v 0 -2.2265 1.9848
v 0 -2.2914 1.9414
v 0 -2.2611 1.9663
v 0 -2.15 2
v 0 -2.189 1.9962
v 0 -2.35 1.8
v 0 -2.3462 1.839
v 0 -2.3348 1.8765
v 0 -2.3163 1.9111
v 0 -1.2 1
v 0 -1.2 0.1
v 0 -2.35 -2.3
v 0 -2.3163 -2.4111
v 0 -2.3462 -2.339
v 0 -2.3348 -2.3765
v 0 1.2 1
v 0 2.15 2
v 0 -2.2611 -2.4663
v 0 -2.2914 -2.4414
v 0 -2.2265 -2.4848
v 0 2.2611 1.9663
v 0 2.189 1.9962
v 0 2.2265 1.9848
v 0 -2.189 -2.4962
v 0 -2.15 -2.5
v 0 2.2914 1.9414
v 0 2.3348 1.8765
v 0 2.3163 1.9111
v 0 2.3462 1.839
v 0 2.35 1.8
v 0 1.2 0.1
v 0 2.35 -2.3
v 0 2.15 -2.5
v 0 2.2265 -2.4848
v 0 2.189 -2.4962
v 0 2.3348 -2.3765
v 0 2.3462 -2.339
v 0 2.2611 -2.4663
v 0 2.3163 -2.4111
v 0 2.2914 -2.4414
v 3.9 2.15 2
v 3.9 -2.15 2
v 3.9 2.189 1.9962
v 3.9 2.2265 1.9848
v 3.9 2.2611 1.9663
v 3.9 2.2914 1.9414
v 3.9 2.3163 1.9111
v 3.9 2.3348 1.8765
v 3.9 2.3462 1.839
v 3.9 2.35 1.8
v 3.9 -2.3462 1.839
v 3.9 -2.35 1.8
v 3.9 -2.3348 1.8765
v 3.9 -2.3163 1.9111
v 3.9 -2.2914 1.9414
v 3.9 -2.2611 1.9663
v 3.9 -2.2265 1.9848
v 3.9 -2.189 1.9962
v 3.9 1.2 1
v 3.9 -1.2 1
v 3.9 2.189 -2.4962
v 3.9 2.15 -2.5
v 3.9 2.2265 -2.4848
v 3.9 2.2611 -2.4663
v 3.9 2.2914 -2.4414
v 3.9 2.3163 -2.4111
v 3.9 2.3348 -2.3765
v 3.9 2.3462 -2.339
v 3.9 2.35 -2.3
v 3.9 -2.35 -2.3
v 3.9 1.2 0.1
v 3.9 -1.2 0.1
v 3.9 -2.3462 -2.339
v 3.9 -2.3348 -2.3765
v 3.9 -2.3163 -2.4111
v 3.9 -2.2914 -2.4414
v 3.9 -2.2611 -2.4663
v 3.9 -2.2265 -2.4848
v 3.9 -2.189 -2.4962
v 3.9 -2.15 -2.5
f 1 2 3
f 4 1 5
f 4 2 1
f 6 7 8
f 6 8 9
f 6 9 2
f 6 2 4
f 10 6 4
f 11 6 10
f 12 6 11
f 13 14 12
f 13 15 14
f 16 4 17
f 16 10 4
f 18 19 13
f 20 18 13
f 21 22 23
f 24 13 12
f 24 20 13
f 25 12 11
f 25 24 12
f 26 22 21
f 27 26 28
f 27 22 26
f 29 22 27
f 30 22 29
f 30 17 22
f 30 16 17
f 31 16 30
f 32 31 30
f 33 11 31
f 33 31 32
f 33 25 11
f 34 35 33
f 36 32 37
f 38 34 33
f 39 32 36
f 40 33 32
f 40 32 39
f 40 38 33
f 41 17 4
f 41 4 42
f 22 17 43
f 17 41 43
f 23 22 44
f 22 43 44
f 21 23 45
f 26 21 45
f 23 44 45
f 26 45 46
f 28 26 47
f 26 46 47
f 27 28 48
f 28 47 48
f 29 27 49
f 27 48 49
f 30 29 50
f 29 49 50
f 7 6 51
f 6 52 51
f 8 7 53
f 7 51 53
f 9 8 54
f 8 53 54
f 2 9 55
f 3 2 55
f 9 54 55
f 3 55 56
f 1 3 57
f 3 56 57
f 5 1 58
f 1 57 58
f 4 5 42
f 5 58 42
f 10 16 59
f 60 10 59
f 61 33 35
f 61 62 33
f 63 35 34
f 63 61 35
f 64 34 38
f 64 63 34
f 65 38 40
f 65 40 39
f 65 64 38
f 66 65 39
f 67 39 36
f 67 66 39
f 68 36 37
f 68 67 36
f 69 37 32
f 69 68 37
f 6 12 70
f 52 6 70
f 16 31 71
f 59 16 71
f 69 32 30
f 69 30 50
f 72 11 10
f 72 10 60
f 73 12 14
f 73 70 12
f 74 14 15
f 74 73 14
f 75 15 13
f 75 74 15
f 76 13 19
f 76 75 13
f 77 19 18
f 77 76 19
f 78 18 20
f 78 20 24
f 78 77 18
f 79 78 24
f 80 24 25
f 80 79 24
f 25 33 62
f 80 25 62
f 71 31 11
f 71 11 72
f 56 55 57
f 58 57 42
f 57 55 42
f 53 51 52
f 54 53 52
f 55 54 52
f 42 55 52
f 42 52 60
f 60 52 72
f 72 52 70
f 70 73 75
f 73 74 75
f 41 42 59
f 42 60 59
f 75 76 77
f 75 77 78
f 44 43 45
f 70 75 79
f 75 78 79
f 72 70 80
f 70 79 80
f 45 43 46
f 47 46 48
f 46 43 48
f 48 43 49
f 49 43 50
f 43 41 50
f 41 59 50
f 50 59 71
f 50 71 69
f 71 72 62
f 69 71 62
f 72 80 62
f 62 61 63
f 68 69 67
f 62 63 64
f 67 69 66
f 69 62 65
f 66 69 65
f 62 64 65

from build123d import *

# Parameters (mm, degrees)
BOX001_W     = 5
BOX001_H     = 2.4
BOX001_DEPTH = 0.9
BOX_W        = 3.9
BOX_H        = 4.7
BOX_DEPTH    = 4.5
FILLET_R     = 0.2


with BuildPart() as w_rfel001:
    # Box001 → Box001 (new body)
    with BuildSketch(Plane(origin=(-0.6, 1.15, 2.6), x_dir=(1, 0, 0), z_dir=(0, 0, 1))):
        with Locations((2.5, 1.2)):
            Rectangle(BOX001_W, BOX001_H)
    extrude(amount=BOX001_DEPTH)


with BuildPart() as fillet_body:
    # Box → Box (new body)
    with BuildSketch(Plane.XY):
        with Locations((1.95, 2.35)):
            Rectangle(BOX_W, BOX_H)
    extrude(amount=BOX_DEPTH)

    # Cut: cut Würfel001
    add(w_rfel001.part, mode=Mode.SUBTRACT)

    # Fillet
    fillet_edges = [fillet_body.edges().sort_by_distance(p)[0] for p in [
        (1.95, 0, 0),
        (1.95, 0, 4.5),
        (1.95, 4.7, 4.5),
        (1.95, 4.7, 0),
    ]]
    fillet(fillet_edges, radius=FILLET_R)


with BuildPart() as fillet_body_1:
    # Fillet placement: moved
    add(fillet_body.part.moved(Location((0, -2.35, -2.5))))


solid = fillet_body_1.part
